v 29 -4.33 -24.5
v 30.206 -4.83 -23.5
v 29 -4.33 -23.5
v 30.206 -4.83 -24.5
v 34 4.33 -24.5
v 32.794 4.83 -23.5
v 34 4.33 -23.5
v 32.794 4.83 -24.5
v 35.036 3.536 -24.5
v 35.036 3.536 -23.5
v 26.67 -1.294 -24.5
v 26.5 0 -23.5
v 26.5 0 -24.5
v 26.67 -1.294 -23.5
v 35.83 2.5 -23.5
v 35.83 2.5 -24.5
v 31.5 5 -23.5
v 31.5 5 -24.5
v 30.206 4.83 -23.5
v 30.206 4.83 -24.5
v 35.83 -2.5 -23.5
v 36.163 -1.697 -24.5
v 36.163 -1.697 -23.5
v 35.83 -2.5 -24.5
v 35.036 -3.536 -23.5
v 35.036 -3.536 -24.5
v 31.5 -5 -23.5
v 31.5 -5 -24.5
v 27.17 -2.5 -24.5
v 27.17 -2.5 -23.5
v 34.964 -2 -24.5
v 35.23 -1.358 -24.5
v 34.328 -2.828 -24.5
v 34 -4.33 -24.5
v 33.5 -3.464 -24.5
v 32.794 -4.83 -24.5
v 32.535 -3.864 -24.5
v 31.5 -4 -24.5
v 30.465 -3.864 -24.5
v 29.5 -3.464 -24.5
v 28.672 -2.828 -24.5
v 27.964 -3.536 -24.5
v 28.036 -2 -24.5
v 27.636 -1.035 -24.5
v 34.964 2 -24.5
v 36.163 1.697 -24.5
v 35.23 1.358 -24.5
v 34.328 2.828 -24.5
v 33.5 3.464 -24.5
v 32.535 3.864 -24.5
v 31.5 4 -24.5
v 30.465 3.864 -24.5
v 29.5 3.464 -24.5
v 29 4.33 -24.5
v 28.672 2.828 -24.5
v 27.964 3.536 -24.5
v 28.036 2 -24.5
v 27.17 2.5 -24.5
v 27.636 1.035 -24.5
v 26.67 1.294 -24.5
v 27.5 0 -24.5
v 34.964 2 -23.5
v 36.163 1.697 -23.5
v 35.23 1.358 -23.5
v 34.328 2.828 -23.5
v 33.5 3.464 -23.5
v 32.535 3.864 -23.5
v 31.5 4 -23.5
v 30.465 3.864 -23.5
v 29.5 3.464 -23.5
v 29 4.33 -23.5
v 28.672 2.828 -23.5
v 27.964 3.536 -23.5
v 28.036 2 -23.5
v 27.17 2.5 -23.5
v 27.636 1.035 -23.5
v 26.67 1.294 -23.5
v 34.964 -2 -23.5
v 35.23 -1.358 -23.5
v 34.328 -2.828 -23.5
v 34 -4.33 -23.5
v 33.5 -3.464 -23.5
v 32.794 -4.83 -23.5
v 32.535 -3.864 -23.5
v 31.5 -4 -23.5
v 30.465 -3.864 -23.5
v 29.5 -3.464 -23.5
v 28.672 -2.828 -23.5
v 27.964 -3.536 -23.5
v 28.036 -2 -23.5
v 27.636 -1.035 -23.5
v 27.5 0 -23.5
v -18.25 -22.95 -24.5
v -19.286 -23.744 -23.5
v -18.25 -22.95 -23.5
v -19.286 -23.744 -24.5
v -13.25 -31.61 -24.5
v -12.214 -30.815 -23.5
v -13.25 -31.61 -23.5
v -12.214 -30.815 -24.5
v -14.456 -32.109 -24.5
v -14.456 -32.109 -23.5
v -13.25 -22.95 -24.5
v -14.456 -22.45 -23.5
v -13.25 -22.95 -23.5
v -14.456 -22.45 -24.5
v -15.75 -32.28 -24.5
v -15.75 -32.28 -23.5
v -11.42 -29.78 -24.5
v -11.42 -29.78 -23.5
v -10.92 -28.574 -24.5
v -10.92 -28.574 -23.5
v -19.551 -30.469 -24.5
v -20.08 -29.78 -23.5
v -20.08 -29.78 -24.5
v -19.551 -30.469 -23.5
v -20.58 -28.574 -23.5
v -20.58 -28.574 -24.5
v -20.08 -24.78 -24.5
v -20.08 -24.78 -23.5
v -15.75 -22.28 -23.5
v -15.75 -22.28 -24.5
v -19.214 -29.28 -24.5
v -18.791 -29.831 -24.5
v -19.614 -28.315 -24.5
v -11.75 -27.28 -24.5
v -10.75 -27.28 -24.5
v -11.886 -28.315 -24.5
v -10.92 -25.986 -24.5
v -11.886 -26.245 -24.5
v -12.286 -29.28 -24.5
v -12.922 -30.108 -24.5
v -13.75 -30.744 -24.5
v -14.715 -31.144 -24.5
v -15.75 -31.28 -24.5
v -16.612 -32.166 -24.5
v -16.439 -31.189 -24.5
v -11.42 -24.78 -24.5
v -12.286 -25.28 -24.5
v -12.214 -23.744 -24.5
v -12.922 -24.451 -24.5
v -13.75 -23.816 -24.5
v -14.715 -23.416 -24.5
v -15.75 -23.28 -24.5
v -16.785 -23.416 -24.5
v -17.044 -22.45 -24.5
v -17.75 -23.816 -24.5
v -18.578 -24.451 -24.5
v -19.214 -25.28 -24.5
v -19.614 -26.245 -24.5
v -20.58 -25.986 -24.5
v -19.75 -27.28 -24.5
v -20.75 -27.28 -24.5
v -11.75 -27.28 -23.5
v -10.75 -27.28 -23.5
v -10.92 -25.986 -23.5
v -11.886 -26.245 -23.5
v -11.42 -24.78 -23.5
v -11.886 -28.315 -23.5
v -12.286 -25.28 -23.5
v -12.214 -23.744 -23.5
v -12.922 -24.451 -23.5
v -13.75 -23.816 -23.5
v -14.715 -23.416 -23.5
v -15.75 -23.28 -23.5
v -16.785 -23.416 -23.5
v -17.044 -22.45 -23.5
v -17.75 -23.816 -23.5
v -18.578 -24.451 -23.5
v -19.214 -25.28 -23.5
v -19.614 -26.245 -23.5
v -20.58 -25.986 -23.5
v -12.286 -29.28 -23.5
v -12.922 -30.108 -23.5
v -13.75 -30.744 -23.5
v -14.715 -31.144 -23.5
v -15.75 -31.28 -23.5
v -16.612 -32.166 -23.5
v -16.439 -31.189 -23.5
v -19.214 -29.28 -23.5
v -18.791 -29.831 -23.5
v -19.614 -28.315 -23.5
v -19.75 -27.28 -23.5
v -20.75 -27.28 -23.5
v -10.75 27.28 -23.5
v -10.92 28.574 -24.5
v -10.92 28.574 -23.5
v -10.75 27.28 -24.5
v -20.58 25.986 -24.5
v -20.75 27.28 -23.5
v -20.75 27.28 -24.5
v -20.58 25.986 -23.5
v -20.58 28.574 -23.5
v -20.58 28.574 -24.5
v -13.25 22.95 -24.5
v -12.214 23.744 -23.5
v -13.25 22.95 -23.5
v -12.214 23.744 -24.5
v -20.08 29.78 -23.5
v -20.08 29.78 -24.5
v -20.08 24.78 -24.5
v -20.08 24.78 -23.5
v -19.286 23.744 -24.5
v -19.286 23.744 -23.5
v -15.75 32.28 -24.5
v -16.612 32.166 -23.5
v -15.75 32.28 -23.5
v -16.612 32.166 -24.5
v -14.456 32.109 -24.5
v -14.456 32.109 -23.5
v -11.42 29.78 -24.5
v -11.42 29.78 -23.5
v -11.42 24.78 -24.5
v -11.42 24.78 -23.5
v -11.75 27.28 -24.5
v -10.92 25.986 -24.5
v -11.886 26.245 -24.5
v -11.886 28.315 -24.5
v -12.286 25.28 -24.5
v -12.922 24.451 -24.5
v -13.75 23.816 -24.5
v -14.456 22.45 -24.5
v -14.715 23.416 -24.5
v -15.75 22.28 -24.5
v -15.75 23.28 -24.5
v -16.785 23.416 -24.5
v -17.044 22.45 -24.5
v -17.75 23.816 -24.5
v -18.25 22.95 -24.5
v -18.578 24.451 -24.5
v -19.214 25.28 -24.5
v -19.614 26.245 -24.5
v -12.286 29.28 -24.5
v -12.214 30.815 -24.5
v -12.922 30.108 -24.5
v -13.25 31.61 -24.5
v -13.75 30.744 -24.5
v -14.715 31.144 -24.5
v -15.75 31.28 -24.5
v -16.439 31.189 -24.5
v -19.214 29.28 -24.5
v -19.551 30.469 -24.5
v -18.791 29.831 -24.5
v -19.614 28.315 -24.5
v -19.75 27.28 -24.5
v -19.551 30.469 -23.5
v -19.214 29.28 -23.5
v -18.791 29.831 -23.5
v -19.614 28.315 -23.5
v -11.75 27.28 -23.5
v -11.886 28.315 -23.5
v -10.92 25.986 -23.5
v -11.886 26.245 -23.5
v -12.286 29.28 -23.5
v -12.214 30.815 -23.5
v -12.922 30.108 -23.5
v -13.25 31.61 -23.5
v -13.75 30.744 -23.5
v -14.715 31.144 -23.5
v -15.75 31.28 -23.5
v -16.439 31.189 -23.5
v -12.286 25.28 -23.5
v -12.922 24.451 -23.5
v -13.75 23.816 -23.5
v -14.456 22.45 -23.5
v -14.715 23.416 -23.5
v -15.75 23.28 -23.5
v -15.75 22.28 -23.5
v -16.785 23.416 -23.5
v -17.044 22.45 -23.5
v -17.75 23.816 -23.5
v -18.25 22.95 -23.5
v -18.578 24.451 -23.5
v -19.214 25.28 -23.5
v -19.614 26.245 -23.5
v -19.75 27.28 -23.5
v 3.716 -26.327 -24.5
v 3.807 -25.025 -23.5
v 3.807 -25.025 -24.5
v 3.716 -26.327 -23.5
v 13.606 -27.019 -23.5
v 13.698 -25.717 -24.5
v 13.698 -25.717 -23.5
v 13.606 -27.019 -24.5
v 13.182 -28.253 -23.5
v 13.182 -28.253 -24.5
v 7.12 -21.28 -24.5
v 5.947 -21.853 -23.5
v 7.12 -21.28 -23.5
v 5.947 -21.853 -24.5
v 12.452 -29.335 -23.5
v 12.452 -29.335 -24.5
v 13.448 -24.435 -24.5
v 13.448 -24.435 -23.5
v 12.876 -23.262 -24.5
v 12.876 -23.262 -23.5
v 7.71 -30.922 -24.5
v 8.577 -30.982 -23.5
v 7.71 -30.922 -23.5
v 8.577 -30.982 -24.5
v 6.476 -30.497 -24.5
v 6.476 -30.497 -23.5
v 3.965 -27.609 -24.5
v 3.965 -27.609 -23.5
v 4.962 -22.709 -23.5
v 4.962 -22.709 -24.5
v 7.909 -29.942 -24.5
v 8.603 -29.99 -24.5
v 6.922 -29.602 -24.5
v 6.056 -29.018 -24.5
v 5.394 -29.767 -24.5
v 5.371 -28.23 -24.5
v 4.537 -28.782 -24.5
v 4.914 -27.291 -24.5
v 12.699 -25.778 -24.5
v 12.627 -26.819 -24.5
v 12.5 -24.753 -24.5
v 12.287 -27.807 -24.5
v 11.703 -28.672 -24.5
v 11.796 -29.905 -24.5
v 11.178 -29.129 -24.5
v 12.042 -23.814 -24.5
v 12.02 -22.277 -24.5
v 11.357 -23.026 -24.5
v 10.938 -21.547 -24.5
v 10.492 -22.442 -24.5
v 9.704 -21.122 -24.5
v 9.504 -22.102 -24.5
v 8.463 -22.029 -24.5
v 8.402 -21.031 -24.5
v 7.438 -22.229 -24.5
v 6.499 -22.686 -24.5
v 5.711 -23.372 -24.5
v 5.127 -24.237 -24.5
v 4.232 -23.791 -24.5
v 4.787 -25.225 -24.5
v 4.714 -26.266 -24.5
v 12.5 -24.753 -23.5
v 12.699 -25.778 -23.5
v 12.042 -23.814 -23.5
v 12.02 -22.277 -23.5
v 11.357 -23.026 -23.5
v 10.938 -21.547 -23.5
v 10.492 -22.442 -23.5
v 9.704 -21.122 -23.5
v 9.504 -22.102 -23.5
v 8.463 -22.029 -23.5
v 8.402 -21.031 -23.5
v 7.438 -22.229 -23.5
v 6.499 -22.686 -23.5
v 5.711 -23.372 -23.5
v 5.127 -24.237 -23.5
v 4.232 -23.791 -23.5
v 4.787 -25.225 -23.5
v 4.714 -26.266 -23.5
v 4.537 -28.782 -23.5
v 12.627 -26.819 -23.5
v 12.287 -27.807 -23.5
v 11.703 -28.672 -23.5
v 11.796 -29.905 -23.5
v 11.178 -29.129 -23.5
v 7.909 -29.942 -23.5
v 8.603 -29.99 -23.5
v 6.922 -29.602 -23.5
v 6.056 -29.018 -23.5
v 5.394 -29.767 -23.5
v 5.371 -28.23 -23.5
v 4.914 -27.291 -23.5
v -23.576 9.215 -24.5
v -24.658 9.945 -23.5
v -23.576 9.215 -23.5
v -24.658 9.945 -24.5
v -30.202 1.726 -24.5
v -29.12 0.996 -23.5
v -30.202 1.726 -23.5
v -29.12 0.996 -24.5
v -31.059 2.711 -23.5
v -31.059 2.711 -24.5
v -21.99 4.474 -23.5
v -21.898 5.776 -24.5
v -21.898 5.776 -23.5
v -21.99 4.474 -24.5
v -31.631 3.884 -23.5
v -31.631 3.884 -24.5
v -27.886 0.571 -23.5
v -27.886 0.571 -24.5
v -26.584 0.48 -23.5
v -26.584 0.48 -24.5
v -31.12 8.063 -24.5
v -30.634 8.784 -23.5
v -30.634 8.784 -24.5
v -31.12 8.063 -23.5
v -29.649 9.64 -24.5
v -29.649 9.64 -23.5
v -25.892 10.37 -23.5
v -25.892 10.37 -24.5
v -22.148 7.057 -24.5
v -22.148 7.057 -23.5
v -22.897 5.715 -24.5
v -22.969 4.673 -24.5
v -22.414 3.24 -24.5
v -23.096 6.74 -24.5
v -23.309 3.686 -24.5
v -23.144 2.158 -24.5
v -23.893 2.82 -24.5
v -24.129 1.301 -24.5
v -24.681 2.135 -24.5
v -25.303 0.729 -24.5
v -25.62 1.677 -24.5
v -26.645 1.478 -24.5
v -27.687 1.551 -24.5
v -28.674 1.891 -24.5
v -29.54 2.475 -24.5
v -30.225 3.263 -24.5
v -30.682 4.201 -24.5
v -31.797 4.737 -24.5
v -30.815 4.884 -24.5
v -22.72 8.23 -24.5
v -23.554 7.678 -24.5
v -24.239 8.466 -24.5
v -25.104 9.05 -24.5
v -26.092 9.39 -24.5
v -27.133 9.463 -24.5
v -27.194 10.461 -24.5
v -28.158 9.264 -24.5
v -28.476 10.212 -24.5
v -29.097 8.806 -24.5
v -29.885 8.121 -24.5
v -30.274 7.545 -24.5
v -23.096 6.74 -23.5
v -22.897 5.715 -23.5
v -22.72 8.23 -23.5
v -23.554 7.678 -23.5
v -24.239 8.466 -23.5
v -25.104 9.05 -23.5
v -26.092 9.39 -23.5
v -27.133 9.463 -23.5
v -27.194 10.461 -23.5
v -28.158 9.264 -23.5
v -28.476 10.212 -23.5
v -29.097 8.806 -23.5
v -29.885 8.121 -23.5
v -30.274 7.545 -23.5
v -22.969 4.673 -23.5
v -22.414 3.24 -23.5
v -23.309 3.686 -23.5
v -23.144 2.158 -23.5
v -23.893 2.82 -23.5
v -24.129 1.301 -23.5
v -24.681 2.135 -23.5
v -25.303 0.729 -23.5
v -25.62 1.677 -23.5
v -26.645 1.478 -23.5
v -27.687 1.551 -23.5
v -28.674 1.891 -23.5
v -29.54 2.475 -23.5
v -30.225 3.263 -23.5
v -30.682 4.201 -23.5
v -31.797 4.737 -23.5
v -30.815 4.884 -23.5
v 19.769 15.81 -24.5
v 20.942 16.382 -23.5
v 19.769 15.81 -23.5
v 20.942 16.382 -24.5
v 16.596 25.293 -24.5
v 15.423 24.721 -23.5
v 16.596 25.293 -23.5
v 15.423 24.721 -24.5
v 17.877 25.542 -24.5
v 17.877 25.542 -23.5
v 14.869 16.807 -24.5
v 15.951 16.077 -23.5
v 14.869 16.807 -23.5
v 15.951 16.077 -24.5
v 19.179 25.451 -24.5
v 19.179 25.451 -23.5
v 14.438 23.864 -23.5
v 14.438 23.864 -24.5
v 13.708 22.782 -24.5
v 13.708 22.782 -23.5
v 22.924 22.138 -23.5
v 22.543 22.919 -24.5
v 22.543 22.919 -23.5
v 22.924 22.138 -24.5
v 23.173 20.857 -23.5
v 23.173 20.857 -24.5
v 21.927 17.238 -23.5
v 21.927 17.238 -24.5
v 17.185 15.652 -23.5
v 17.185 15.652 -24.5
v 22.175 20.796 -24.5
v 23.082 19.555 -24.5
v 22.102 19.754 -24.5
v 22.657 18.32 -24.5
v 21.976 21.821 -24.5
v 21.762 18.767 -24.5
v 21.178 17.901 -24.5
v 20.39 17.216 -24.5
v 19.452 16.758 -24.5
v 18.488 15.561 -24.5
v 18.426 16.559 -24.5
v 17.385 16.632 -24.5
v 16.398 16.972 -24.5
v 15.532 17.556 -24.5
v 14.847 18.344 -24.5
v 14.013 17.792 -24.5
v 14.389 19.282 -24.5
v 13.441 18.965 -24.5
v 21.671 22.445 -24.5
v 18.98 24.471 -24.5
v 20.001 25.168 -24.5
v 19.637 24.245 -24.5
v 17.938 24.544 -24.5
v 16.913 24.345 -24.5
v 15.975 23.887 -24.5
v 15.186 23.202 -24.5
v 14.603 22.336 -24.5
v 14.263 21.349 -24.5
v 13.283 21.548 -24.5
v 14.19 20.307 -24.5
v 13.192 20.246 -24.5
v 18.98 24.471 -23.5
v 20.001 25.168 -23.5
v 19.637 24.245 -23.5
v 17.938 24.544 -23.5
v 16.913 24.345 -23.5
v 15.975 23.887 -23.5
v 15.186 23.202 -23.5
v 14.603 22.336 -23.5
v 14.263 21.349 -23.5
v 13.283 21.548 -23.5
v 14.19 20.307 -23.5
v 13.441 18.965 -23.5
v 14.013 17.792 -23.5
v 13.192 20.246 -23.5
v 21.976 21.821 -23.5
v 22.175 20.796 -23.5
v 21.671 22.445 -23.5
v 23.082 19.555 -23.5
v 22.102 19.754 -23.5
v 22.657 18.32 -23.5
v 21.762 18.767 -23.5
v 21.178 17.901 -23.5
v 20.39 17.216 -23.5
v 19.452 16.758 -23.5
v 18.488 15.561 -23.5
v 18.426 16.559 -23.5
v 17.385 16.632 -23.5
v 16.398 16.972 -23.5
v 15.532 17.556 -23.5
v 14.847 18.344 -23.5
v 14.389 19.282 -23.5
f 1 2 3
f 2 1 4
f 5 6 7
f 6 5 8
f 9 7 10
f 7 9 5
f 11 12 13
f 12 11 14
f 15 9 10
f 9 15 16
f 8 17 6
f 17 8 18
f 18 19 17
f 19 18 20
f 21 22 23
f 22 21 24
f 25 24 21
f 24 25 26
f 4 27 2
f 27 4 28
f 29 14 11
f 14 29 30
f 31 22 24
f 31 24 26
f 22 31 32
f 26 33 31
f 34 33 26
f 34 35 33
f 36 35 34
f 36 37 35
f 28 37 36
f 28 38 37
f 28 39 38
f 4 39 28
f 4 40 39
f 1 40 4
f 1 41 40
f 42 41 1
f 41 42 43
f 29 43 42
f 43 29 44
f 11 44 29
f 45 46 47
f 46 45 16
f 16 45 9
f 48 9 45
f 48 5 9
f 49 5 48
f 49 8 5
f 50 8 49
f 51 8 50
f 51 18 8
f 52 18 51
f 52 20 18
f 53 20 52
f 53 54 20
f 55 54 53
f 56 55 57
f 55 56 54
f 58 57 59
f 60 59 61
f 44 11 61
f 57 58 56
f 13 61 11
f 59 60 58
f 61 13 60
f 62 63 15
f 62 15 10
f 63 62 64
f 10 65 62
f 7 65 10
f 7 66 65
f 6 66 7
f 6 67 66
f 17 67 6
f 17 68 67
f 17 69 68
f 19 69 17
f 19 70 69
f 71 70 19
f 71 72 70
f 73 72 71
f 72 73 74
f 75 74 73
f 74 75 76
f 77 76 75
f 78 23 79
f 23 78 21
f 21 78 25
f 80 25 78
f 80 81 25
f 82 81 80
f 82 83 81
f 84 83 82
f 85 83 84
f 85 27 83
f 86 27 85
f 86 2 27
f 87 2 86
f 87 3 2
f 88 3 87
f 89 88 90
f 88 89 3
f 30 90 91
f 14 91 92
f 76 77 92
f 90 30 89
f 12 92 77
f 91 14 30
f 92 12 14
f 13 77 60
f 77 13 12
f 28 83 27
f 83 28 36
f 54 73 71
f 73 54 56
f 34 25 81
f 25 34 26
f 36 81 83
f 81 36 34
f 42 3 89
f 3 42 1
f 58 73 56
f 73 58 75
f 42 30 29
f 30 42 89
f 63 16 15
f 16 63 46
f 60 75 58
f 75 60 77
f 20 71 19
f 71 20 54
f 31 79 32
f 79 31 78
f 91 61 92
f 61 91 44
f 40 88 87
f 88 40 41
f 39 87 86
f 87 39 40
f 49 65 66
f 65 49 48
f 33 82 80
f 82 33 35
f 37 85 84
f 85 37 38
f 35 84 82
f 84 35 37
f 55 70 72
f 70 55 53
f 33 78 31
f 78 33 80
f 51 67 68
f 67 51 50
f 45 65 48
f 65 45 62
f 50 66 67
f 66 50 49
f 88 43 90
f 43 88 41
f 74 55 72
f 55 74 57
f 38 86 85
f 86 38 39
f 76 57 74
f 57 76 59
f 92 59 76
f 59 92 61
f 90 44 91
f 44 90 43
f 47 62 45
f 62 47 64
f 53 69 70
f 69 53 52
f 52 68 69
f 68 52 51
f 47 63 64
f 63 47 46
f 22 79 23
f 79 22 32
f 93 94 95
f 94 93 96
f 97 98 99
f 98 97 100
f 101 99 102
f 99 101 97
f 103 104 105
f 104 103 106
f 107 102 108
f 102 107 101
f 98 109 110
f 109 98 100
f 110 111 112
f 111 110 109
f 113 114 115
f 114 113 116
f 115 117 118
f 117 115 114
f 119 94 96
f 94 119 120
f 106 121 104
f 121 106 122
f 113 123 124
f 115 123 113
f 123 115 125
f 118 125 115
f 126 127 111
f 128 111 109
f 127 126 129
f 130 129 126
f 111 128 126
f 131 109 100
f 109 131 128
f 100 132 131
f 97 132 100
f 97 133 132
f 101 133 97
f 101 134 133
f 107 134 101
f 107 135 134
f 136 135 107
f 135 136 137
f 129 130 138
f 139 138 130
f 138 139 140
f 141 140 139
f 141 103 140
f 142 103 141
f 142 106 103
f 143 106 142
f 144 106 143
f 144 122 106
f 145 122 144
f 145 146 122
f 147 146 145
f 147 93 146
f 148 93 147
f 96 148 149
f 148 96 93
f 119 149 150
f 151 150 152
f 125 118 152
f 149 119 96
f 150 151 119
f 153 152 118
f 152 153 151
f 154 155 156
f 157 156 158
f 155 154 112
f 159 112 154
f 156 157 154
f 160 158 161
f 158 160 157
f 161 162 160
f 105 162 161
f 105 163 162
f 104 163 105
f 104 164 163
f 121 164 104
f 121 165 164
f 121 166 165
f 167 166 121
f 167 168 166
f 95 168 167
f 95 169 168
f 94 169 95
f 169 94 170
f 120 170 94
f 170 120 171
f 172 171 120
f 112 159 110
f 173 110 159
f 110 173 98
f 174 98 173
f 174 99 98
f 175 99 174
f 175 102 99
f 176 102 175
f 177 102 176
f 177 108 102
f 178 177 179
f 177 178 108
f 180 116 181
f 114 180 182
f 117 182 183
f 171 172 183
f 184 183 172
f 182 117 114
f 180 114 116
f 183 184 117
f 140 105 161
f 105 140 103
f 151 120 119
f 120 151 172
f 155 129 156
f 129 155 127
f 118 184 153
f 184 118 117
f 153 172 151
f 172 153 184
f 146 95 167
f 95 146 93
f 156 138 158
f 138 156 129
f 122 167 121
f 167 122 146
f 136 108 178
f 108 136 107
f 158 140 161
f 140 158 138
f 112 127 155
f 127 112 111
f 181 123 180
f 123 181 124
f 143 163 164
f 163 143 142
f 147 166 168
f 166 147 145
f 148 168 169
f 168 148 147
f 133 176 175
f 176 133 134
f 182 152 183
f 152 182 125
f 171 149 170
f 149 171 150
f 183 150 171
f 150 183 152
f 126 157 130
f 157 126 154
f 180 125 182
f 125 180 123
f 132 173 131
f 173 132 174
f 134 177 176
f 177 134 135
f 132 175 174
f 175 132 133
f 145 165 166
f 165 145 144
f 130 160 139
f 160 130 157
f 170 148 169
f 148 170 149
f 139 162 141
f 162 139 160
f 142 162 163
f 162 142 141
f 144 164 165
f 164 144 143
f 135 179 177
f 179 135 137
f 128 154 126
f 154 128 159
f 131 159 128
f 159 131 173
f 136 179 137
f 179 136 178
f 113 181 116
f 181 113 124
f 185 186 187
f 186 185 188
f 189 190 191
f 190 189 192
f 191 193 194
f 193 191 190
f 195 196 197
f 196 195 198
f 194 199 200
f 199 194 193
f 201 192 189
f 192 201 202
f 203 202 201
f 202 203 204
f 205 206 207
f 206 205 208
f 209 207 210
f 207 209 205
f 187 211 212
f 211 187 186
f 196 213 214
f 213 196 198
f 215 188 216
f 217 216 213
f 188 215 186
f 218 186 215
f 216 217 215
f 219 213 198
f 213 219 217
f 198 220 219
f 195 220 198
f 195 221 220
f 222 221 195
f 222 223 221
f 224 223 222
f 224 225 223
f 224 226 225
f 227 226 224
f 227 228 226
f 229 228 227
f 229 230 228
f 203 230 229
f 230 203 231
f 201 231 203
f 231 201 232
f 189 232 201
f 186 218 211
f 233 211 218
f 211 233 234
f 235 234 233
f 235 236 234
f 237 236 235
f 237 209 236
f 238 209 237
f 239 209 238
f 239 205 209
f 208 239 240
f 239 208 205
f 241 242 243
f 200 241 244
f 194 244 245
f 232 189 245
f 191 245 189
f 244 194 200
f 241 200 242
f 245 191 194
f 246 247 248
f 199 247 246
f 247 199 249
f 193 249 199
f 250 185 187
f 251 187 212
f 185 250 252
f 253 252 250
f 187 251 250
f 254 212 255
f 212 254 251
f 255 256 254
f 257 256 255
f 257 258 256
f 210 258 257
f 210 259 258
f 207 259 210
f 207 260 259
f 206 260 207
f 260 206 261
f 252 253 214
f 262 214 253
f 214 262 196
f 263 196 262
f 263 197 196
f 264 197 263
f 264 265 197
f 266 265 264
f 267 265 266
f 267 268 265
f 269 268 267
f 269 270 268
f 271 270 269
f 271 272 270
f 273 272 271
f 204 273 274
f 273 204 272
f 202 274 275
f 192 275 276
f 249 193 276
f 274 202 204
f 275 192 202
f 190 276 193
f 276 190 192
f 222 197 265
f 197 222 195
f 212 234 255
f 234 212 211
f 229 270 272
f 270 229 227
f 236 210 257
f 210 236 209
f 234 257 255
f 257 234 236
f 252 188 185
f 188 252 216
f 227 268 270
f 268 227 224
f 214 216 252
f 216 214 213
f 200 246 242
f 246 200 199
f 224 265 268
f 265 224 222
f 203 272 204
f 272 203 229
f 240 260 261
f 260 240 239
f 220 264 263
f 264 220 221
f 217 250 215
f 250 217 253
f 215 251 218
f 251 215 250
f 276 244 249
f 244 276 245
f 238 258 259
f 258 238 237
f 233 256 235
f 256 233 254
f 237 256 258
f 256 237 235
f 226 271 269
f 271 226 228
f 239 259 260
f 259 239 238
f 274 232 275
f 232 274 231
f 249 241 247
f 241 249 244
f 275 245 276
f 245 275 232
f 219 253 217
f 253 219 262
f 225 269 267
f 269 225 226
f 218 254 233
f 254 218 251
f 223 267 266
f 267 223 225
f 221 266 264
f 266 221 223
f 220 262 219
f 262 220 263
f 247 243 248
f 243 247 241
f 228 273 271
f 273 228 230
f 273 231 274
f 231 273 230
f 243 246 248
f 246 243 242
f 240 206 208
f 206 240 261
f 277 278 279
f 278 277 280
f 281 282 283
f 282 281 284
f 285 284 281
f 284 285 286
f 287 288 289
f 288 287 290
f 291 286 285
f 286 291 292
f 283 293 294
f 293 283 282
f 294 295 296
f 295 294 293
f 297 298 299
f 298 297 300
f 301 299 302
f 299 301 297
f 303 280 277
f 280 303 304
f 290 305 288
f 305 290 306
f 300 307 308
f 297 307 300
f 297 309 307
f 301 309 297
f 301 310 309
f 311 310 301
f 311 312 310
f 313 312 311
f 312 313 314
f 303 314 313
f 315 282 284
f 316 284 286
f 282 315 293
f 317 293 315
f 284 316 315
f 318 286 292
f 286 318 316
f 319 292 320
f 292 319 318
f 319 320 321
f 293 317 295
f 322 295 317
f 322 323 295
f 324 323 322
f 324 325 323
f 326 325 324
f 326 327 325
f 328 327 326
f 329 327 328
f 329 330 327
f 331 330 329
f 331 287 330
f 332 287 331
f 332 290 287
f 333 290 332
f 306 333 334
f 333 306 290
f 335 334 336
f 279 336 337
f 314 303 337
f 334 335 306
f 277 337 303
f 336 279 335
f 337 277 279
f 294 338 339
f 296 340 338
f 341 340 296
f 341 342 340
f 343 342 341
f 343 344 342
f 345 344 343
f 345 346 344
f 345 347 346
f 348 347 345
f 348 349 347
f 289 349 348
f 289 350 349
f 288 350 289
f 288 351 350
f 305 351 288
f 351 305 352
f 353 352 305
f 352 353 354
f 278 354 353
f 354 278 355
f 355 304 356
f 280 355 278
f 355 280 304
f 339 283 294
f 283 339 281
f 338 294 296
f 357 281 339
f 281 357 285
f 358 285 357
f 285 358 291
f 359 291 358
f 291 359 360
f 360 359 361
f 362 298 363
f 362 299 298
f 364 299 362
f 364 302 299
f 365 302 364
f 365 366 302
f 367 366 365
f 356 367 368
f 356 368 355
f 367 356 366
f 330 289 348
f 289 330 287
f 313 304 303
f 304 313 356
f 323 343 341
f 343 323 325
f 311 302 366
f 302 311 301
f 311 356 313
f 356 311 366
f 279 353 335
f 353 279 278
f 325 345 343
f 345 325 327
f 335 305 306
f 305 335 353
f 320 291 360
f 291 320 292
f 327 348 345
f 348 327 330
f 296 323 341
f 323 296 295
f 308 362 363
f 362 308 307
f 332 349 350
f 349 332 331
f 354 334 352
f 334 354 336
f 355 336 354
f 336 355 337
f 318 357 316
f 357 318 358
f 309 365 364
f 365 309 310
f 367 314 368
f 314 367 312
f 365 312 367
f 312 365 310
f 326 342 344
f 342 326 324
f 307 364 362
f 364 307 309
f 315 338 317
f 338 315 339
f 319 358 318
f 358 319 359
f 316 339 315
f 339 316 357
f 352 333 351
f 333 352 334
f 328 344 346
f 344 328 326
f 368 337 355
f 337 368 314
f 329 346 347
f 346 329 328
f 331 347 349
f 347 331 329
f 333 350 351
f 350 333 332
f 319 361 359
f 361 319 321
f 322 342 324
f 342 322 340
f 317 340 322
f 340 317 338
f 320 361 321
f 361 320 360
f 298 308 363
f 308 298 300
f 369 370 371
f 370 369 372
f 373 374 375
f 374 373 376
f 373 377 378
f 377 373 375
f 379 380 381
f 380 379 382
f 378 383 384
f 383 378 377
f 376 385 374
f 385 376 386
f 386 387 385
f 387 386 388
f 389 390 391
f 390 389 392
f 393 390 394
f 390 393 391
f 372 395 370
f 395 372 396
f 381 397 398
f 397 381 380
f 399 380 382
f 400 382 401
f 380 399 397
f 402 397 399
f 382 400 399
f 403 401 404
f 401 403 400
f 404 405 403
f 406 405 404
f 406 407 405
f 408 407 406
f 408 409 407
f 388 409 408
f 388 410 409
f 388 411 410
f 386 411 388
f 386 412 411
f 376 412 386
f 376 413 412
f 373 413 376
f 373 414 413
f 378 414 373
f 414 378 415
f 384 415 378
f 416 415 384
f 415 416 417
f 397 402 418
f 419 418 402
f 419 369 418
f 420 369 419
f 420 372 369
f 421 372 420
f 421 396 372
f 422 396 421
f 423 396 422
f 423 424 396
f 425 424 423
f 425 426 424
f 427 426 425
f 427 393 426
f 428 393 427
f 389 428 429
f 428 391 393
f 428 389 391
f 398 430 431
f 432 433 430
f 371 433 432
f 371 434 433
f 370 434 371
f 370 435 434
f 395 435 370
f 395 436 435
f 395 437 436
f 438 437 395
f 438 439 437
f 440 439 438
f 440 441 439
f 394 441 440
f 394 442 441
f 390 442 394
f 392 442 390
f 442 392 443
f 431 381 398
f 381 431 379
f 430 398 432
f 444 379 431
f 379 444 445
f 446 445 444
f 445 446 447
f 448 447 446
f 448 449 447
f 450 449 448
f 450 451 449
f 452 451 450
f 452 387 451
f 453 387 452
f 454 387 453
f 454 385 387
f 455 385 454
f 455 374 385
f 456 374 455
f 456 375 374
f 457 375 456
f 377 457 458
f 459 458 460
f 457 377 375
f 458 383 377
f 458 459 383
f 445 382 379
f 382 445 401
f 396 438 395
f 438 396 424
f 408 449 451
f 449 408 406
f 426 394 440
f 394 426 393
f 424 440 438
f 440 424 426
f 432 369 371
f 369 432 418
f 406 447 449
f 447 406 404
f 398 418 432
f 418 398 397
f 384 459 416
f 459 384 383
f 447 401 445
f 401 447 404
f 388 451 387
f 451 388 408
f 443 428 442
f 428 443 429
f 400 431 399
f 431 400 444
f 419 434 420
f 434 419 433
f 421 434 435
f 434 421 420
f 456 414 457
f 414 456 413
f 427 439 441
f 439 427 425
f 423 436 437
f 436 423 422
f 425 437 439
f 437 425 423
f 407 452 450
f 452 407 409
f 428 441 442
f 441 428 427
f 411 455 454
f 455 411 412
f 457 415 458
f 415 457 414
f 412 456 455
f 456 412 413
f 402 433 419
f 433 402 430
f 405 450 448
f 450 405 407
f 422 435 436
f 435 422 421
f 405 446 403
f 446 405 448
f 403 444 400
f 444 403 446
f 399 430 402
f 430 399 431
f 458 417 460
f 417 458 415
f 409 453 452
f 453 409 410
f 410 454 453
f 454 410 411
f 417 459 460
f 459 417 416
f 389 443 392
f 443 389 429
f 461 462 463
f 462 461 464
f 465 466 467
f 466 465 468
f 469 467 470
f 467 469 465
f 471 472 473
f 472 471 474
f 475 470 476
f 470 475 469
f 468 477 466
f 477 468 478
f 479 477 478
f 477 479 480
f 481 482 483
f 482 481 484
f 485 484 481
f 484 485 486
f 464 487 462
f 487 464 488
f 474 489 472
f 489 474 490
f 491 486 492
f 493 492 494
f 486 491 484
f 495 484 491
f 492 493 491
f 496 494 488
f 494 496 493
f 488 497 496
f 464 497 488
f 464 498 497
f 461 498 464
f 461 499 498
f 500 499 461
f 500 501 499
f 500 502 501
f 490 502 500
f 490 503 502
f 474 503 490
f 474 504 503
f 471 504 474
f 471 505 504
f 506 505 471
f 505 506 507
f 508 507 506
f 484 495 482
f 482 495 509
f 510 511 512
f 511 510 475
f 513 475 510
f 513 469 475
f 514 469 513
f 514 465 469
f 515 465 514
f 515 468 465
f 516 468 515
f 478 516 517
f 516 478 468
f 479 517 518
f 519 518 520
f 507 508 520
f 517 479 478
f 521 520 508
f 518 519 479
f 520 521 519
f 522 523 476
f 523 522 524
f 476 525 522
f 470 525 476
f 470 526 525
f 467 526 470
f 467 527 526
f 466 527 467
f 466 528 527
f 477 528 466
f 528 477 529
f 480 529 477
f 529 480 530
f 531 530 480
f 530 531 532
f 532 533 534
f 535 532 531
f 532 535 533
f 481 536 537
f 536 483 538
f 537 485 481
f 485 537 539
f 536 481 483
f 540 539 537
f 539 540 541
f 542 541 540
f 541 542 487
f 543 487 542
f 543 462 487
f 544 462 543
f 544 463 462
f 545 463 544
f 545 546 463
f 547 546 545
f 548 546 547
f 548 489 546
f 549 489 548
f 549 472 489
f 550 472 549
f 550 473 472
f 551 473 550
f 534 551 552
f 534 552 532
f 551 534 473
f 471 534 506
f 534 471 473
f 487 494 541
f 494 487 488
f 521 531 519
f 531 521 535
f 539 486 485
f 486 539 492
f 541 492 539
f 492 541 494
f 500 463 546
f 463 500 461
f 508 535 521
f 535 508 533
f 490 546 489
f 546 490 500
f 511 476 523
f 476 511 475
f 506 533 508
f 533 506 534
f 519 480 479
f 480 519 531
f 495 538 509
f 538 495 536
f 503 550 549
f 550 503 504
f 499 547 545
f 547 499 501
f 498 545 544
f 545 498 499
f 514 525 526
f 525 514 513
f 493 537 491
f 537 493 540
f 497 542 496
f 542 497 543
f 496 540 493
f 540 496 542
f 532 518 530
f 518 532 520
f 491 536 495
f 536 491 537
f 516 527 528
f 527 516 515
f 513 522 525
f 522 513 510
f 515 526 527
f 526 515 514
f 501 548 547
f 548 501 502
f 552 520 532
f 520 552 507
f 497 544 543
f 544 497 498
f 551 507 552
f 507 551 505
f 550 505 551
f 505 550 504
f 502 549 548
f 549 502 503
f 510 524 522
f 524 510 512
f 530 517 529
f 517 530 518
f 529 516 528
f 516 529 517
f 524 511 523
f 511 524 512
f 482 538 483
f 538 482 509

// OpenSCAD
// ============================================================
// E-CLIPS — Retaining clips for planet pins
// ============================================================

include <../params.scad>

// --- E-clip (retaining clip) ---
module e_clip(od=10, id=8, h=1, gap_angle=40) {
    difference() {
        cylinder(d=od, h=h, $fn=24);
        translate([0, 0, -0.1])
        cylinder(d=id, h=h + 0.2, $fn=24);
        // Cut gap sector
        rotate([0, 0, -gap_angle/2])
        linear_extrude(height=h + 0.2)
        polygon([
            [0, 0],
            [od, 0],
            [od * cos(gap_angle), od * sin(gap_angle)],
        ]);
    }
}

// --- Clip assembly (all parametric e-clips) ---
module clip_assembly() {
    // E-clips at Po pin tops (above carrier_1 underside)
    for (i = [0:2])
        color(C_CLIP)
        rotate([0, 0, ANG_CARRIER + i * 120])
        translate([PO_ORBIT, 0, PO_ZTOP + WASHER_H + 0.3])
        e_clip();

    // E-clips at Pi pin tops (above carrier_1 underside)
    for (i = [0:2])
        color(C_CLIP)
        rotate([0, 0, ANG_CARRIER + i * 120 + PI_ANG_OFFSET])
        translate([PI_ORBIT_ACTUAL, 0, PI_ZTOP + WASHER_H + 0.3])
        e_clip();
}

// ============================================================
// STANDALONE PREVIEW
// ============================================================
$fn = 24;
rotate([180, 0, 0]) clip_assembly();
